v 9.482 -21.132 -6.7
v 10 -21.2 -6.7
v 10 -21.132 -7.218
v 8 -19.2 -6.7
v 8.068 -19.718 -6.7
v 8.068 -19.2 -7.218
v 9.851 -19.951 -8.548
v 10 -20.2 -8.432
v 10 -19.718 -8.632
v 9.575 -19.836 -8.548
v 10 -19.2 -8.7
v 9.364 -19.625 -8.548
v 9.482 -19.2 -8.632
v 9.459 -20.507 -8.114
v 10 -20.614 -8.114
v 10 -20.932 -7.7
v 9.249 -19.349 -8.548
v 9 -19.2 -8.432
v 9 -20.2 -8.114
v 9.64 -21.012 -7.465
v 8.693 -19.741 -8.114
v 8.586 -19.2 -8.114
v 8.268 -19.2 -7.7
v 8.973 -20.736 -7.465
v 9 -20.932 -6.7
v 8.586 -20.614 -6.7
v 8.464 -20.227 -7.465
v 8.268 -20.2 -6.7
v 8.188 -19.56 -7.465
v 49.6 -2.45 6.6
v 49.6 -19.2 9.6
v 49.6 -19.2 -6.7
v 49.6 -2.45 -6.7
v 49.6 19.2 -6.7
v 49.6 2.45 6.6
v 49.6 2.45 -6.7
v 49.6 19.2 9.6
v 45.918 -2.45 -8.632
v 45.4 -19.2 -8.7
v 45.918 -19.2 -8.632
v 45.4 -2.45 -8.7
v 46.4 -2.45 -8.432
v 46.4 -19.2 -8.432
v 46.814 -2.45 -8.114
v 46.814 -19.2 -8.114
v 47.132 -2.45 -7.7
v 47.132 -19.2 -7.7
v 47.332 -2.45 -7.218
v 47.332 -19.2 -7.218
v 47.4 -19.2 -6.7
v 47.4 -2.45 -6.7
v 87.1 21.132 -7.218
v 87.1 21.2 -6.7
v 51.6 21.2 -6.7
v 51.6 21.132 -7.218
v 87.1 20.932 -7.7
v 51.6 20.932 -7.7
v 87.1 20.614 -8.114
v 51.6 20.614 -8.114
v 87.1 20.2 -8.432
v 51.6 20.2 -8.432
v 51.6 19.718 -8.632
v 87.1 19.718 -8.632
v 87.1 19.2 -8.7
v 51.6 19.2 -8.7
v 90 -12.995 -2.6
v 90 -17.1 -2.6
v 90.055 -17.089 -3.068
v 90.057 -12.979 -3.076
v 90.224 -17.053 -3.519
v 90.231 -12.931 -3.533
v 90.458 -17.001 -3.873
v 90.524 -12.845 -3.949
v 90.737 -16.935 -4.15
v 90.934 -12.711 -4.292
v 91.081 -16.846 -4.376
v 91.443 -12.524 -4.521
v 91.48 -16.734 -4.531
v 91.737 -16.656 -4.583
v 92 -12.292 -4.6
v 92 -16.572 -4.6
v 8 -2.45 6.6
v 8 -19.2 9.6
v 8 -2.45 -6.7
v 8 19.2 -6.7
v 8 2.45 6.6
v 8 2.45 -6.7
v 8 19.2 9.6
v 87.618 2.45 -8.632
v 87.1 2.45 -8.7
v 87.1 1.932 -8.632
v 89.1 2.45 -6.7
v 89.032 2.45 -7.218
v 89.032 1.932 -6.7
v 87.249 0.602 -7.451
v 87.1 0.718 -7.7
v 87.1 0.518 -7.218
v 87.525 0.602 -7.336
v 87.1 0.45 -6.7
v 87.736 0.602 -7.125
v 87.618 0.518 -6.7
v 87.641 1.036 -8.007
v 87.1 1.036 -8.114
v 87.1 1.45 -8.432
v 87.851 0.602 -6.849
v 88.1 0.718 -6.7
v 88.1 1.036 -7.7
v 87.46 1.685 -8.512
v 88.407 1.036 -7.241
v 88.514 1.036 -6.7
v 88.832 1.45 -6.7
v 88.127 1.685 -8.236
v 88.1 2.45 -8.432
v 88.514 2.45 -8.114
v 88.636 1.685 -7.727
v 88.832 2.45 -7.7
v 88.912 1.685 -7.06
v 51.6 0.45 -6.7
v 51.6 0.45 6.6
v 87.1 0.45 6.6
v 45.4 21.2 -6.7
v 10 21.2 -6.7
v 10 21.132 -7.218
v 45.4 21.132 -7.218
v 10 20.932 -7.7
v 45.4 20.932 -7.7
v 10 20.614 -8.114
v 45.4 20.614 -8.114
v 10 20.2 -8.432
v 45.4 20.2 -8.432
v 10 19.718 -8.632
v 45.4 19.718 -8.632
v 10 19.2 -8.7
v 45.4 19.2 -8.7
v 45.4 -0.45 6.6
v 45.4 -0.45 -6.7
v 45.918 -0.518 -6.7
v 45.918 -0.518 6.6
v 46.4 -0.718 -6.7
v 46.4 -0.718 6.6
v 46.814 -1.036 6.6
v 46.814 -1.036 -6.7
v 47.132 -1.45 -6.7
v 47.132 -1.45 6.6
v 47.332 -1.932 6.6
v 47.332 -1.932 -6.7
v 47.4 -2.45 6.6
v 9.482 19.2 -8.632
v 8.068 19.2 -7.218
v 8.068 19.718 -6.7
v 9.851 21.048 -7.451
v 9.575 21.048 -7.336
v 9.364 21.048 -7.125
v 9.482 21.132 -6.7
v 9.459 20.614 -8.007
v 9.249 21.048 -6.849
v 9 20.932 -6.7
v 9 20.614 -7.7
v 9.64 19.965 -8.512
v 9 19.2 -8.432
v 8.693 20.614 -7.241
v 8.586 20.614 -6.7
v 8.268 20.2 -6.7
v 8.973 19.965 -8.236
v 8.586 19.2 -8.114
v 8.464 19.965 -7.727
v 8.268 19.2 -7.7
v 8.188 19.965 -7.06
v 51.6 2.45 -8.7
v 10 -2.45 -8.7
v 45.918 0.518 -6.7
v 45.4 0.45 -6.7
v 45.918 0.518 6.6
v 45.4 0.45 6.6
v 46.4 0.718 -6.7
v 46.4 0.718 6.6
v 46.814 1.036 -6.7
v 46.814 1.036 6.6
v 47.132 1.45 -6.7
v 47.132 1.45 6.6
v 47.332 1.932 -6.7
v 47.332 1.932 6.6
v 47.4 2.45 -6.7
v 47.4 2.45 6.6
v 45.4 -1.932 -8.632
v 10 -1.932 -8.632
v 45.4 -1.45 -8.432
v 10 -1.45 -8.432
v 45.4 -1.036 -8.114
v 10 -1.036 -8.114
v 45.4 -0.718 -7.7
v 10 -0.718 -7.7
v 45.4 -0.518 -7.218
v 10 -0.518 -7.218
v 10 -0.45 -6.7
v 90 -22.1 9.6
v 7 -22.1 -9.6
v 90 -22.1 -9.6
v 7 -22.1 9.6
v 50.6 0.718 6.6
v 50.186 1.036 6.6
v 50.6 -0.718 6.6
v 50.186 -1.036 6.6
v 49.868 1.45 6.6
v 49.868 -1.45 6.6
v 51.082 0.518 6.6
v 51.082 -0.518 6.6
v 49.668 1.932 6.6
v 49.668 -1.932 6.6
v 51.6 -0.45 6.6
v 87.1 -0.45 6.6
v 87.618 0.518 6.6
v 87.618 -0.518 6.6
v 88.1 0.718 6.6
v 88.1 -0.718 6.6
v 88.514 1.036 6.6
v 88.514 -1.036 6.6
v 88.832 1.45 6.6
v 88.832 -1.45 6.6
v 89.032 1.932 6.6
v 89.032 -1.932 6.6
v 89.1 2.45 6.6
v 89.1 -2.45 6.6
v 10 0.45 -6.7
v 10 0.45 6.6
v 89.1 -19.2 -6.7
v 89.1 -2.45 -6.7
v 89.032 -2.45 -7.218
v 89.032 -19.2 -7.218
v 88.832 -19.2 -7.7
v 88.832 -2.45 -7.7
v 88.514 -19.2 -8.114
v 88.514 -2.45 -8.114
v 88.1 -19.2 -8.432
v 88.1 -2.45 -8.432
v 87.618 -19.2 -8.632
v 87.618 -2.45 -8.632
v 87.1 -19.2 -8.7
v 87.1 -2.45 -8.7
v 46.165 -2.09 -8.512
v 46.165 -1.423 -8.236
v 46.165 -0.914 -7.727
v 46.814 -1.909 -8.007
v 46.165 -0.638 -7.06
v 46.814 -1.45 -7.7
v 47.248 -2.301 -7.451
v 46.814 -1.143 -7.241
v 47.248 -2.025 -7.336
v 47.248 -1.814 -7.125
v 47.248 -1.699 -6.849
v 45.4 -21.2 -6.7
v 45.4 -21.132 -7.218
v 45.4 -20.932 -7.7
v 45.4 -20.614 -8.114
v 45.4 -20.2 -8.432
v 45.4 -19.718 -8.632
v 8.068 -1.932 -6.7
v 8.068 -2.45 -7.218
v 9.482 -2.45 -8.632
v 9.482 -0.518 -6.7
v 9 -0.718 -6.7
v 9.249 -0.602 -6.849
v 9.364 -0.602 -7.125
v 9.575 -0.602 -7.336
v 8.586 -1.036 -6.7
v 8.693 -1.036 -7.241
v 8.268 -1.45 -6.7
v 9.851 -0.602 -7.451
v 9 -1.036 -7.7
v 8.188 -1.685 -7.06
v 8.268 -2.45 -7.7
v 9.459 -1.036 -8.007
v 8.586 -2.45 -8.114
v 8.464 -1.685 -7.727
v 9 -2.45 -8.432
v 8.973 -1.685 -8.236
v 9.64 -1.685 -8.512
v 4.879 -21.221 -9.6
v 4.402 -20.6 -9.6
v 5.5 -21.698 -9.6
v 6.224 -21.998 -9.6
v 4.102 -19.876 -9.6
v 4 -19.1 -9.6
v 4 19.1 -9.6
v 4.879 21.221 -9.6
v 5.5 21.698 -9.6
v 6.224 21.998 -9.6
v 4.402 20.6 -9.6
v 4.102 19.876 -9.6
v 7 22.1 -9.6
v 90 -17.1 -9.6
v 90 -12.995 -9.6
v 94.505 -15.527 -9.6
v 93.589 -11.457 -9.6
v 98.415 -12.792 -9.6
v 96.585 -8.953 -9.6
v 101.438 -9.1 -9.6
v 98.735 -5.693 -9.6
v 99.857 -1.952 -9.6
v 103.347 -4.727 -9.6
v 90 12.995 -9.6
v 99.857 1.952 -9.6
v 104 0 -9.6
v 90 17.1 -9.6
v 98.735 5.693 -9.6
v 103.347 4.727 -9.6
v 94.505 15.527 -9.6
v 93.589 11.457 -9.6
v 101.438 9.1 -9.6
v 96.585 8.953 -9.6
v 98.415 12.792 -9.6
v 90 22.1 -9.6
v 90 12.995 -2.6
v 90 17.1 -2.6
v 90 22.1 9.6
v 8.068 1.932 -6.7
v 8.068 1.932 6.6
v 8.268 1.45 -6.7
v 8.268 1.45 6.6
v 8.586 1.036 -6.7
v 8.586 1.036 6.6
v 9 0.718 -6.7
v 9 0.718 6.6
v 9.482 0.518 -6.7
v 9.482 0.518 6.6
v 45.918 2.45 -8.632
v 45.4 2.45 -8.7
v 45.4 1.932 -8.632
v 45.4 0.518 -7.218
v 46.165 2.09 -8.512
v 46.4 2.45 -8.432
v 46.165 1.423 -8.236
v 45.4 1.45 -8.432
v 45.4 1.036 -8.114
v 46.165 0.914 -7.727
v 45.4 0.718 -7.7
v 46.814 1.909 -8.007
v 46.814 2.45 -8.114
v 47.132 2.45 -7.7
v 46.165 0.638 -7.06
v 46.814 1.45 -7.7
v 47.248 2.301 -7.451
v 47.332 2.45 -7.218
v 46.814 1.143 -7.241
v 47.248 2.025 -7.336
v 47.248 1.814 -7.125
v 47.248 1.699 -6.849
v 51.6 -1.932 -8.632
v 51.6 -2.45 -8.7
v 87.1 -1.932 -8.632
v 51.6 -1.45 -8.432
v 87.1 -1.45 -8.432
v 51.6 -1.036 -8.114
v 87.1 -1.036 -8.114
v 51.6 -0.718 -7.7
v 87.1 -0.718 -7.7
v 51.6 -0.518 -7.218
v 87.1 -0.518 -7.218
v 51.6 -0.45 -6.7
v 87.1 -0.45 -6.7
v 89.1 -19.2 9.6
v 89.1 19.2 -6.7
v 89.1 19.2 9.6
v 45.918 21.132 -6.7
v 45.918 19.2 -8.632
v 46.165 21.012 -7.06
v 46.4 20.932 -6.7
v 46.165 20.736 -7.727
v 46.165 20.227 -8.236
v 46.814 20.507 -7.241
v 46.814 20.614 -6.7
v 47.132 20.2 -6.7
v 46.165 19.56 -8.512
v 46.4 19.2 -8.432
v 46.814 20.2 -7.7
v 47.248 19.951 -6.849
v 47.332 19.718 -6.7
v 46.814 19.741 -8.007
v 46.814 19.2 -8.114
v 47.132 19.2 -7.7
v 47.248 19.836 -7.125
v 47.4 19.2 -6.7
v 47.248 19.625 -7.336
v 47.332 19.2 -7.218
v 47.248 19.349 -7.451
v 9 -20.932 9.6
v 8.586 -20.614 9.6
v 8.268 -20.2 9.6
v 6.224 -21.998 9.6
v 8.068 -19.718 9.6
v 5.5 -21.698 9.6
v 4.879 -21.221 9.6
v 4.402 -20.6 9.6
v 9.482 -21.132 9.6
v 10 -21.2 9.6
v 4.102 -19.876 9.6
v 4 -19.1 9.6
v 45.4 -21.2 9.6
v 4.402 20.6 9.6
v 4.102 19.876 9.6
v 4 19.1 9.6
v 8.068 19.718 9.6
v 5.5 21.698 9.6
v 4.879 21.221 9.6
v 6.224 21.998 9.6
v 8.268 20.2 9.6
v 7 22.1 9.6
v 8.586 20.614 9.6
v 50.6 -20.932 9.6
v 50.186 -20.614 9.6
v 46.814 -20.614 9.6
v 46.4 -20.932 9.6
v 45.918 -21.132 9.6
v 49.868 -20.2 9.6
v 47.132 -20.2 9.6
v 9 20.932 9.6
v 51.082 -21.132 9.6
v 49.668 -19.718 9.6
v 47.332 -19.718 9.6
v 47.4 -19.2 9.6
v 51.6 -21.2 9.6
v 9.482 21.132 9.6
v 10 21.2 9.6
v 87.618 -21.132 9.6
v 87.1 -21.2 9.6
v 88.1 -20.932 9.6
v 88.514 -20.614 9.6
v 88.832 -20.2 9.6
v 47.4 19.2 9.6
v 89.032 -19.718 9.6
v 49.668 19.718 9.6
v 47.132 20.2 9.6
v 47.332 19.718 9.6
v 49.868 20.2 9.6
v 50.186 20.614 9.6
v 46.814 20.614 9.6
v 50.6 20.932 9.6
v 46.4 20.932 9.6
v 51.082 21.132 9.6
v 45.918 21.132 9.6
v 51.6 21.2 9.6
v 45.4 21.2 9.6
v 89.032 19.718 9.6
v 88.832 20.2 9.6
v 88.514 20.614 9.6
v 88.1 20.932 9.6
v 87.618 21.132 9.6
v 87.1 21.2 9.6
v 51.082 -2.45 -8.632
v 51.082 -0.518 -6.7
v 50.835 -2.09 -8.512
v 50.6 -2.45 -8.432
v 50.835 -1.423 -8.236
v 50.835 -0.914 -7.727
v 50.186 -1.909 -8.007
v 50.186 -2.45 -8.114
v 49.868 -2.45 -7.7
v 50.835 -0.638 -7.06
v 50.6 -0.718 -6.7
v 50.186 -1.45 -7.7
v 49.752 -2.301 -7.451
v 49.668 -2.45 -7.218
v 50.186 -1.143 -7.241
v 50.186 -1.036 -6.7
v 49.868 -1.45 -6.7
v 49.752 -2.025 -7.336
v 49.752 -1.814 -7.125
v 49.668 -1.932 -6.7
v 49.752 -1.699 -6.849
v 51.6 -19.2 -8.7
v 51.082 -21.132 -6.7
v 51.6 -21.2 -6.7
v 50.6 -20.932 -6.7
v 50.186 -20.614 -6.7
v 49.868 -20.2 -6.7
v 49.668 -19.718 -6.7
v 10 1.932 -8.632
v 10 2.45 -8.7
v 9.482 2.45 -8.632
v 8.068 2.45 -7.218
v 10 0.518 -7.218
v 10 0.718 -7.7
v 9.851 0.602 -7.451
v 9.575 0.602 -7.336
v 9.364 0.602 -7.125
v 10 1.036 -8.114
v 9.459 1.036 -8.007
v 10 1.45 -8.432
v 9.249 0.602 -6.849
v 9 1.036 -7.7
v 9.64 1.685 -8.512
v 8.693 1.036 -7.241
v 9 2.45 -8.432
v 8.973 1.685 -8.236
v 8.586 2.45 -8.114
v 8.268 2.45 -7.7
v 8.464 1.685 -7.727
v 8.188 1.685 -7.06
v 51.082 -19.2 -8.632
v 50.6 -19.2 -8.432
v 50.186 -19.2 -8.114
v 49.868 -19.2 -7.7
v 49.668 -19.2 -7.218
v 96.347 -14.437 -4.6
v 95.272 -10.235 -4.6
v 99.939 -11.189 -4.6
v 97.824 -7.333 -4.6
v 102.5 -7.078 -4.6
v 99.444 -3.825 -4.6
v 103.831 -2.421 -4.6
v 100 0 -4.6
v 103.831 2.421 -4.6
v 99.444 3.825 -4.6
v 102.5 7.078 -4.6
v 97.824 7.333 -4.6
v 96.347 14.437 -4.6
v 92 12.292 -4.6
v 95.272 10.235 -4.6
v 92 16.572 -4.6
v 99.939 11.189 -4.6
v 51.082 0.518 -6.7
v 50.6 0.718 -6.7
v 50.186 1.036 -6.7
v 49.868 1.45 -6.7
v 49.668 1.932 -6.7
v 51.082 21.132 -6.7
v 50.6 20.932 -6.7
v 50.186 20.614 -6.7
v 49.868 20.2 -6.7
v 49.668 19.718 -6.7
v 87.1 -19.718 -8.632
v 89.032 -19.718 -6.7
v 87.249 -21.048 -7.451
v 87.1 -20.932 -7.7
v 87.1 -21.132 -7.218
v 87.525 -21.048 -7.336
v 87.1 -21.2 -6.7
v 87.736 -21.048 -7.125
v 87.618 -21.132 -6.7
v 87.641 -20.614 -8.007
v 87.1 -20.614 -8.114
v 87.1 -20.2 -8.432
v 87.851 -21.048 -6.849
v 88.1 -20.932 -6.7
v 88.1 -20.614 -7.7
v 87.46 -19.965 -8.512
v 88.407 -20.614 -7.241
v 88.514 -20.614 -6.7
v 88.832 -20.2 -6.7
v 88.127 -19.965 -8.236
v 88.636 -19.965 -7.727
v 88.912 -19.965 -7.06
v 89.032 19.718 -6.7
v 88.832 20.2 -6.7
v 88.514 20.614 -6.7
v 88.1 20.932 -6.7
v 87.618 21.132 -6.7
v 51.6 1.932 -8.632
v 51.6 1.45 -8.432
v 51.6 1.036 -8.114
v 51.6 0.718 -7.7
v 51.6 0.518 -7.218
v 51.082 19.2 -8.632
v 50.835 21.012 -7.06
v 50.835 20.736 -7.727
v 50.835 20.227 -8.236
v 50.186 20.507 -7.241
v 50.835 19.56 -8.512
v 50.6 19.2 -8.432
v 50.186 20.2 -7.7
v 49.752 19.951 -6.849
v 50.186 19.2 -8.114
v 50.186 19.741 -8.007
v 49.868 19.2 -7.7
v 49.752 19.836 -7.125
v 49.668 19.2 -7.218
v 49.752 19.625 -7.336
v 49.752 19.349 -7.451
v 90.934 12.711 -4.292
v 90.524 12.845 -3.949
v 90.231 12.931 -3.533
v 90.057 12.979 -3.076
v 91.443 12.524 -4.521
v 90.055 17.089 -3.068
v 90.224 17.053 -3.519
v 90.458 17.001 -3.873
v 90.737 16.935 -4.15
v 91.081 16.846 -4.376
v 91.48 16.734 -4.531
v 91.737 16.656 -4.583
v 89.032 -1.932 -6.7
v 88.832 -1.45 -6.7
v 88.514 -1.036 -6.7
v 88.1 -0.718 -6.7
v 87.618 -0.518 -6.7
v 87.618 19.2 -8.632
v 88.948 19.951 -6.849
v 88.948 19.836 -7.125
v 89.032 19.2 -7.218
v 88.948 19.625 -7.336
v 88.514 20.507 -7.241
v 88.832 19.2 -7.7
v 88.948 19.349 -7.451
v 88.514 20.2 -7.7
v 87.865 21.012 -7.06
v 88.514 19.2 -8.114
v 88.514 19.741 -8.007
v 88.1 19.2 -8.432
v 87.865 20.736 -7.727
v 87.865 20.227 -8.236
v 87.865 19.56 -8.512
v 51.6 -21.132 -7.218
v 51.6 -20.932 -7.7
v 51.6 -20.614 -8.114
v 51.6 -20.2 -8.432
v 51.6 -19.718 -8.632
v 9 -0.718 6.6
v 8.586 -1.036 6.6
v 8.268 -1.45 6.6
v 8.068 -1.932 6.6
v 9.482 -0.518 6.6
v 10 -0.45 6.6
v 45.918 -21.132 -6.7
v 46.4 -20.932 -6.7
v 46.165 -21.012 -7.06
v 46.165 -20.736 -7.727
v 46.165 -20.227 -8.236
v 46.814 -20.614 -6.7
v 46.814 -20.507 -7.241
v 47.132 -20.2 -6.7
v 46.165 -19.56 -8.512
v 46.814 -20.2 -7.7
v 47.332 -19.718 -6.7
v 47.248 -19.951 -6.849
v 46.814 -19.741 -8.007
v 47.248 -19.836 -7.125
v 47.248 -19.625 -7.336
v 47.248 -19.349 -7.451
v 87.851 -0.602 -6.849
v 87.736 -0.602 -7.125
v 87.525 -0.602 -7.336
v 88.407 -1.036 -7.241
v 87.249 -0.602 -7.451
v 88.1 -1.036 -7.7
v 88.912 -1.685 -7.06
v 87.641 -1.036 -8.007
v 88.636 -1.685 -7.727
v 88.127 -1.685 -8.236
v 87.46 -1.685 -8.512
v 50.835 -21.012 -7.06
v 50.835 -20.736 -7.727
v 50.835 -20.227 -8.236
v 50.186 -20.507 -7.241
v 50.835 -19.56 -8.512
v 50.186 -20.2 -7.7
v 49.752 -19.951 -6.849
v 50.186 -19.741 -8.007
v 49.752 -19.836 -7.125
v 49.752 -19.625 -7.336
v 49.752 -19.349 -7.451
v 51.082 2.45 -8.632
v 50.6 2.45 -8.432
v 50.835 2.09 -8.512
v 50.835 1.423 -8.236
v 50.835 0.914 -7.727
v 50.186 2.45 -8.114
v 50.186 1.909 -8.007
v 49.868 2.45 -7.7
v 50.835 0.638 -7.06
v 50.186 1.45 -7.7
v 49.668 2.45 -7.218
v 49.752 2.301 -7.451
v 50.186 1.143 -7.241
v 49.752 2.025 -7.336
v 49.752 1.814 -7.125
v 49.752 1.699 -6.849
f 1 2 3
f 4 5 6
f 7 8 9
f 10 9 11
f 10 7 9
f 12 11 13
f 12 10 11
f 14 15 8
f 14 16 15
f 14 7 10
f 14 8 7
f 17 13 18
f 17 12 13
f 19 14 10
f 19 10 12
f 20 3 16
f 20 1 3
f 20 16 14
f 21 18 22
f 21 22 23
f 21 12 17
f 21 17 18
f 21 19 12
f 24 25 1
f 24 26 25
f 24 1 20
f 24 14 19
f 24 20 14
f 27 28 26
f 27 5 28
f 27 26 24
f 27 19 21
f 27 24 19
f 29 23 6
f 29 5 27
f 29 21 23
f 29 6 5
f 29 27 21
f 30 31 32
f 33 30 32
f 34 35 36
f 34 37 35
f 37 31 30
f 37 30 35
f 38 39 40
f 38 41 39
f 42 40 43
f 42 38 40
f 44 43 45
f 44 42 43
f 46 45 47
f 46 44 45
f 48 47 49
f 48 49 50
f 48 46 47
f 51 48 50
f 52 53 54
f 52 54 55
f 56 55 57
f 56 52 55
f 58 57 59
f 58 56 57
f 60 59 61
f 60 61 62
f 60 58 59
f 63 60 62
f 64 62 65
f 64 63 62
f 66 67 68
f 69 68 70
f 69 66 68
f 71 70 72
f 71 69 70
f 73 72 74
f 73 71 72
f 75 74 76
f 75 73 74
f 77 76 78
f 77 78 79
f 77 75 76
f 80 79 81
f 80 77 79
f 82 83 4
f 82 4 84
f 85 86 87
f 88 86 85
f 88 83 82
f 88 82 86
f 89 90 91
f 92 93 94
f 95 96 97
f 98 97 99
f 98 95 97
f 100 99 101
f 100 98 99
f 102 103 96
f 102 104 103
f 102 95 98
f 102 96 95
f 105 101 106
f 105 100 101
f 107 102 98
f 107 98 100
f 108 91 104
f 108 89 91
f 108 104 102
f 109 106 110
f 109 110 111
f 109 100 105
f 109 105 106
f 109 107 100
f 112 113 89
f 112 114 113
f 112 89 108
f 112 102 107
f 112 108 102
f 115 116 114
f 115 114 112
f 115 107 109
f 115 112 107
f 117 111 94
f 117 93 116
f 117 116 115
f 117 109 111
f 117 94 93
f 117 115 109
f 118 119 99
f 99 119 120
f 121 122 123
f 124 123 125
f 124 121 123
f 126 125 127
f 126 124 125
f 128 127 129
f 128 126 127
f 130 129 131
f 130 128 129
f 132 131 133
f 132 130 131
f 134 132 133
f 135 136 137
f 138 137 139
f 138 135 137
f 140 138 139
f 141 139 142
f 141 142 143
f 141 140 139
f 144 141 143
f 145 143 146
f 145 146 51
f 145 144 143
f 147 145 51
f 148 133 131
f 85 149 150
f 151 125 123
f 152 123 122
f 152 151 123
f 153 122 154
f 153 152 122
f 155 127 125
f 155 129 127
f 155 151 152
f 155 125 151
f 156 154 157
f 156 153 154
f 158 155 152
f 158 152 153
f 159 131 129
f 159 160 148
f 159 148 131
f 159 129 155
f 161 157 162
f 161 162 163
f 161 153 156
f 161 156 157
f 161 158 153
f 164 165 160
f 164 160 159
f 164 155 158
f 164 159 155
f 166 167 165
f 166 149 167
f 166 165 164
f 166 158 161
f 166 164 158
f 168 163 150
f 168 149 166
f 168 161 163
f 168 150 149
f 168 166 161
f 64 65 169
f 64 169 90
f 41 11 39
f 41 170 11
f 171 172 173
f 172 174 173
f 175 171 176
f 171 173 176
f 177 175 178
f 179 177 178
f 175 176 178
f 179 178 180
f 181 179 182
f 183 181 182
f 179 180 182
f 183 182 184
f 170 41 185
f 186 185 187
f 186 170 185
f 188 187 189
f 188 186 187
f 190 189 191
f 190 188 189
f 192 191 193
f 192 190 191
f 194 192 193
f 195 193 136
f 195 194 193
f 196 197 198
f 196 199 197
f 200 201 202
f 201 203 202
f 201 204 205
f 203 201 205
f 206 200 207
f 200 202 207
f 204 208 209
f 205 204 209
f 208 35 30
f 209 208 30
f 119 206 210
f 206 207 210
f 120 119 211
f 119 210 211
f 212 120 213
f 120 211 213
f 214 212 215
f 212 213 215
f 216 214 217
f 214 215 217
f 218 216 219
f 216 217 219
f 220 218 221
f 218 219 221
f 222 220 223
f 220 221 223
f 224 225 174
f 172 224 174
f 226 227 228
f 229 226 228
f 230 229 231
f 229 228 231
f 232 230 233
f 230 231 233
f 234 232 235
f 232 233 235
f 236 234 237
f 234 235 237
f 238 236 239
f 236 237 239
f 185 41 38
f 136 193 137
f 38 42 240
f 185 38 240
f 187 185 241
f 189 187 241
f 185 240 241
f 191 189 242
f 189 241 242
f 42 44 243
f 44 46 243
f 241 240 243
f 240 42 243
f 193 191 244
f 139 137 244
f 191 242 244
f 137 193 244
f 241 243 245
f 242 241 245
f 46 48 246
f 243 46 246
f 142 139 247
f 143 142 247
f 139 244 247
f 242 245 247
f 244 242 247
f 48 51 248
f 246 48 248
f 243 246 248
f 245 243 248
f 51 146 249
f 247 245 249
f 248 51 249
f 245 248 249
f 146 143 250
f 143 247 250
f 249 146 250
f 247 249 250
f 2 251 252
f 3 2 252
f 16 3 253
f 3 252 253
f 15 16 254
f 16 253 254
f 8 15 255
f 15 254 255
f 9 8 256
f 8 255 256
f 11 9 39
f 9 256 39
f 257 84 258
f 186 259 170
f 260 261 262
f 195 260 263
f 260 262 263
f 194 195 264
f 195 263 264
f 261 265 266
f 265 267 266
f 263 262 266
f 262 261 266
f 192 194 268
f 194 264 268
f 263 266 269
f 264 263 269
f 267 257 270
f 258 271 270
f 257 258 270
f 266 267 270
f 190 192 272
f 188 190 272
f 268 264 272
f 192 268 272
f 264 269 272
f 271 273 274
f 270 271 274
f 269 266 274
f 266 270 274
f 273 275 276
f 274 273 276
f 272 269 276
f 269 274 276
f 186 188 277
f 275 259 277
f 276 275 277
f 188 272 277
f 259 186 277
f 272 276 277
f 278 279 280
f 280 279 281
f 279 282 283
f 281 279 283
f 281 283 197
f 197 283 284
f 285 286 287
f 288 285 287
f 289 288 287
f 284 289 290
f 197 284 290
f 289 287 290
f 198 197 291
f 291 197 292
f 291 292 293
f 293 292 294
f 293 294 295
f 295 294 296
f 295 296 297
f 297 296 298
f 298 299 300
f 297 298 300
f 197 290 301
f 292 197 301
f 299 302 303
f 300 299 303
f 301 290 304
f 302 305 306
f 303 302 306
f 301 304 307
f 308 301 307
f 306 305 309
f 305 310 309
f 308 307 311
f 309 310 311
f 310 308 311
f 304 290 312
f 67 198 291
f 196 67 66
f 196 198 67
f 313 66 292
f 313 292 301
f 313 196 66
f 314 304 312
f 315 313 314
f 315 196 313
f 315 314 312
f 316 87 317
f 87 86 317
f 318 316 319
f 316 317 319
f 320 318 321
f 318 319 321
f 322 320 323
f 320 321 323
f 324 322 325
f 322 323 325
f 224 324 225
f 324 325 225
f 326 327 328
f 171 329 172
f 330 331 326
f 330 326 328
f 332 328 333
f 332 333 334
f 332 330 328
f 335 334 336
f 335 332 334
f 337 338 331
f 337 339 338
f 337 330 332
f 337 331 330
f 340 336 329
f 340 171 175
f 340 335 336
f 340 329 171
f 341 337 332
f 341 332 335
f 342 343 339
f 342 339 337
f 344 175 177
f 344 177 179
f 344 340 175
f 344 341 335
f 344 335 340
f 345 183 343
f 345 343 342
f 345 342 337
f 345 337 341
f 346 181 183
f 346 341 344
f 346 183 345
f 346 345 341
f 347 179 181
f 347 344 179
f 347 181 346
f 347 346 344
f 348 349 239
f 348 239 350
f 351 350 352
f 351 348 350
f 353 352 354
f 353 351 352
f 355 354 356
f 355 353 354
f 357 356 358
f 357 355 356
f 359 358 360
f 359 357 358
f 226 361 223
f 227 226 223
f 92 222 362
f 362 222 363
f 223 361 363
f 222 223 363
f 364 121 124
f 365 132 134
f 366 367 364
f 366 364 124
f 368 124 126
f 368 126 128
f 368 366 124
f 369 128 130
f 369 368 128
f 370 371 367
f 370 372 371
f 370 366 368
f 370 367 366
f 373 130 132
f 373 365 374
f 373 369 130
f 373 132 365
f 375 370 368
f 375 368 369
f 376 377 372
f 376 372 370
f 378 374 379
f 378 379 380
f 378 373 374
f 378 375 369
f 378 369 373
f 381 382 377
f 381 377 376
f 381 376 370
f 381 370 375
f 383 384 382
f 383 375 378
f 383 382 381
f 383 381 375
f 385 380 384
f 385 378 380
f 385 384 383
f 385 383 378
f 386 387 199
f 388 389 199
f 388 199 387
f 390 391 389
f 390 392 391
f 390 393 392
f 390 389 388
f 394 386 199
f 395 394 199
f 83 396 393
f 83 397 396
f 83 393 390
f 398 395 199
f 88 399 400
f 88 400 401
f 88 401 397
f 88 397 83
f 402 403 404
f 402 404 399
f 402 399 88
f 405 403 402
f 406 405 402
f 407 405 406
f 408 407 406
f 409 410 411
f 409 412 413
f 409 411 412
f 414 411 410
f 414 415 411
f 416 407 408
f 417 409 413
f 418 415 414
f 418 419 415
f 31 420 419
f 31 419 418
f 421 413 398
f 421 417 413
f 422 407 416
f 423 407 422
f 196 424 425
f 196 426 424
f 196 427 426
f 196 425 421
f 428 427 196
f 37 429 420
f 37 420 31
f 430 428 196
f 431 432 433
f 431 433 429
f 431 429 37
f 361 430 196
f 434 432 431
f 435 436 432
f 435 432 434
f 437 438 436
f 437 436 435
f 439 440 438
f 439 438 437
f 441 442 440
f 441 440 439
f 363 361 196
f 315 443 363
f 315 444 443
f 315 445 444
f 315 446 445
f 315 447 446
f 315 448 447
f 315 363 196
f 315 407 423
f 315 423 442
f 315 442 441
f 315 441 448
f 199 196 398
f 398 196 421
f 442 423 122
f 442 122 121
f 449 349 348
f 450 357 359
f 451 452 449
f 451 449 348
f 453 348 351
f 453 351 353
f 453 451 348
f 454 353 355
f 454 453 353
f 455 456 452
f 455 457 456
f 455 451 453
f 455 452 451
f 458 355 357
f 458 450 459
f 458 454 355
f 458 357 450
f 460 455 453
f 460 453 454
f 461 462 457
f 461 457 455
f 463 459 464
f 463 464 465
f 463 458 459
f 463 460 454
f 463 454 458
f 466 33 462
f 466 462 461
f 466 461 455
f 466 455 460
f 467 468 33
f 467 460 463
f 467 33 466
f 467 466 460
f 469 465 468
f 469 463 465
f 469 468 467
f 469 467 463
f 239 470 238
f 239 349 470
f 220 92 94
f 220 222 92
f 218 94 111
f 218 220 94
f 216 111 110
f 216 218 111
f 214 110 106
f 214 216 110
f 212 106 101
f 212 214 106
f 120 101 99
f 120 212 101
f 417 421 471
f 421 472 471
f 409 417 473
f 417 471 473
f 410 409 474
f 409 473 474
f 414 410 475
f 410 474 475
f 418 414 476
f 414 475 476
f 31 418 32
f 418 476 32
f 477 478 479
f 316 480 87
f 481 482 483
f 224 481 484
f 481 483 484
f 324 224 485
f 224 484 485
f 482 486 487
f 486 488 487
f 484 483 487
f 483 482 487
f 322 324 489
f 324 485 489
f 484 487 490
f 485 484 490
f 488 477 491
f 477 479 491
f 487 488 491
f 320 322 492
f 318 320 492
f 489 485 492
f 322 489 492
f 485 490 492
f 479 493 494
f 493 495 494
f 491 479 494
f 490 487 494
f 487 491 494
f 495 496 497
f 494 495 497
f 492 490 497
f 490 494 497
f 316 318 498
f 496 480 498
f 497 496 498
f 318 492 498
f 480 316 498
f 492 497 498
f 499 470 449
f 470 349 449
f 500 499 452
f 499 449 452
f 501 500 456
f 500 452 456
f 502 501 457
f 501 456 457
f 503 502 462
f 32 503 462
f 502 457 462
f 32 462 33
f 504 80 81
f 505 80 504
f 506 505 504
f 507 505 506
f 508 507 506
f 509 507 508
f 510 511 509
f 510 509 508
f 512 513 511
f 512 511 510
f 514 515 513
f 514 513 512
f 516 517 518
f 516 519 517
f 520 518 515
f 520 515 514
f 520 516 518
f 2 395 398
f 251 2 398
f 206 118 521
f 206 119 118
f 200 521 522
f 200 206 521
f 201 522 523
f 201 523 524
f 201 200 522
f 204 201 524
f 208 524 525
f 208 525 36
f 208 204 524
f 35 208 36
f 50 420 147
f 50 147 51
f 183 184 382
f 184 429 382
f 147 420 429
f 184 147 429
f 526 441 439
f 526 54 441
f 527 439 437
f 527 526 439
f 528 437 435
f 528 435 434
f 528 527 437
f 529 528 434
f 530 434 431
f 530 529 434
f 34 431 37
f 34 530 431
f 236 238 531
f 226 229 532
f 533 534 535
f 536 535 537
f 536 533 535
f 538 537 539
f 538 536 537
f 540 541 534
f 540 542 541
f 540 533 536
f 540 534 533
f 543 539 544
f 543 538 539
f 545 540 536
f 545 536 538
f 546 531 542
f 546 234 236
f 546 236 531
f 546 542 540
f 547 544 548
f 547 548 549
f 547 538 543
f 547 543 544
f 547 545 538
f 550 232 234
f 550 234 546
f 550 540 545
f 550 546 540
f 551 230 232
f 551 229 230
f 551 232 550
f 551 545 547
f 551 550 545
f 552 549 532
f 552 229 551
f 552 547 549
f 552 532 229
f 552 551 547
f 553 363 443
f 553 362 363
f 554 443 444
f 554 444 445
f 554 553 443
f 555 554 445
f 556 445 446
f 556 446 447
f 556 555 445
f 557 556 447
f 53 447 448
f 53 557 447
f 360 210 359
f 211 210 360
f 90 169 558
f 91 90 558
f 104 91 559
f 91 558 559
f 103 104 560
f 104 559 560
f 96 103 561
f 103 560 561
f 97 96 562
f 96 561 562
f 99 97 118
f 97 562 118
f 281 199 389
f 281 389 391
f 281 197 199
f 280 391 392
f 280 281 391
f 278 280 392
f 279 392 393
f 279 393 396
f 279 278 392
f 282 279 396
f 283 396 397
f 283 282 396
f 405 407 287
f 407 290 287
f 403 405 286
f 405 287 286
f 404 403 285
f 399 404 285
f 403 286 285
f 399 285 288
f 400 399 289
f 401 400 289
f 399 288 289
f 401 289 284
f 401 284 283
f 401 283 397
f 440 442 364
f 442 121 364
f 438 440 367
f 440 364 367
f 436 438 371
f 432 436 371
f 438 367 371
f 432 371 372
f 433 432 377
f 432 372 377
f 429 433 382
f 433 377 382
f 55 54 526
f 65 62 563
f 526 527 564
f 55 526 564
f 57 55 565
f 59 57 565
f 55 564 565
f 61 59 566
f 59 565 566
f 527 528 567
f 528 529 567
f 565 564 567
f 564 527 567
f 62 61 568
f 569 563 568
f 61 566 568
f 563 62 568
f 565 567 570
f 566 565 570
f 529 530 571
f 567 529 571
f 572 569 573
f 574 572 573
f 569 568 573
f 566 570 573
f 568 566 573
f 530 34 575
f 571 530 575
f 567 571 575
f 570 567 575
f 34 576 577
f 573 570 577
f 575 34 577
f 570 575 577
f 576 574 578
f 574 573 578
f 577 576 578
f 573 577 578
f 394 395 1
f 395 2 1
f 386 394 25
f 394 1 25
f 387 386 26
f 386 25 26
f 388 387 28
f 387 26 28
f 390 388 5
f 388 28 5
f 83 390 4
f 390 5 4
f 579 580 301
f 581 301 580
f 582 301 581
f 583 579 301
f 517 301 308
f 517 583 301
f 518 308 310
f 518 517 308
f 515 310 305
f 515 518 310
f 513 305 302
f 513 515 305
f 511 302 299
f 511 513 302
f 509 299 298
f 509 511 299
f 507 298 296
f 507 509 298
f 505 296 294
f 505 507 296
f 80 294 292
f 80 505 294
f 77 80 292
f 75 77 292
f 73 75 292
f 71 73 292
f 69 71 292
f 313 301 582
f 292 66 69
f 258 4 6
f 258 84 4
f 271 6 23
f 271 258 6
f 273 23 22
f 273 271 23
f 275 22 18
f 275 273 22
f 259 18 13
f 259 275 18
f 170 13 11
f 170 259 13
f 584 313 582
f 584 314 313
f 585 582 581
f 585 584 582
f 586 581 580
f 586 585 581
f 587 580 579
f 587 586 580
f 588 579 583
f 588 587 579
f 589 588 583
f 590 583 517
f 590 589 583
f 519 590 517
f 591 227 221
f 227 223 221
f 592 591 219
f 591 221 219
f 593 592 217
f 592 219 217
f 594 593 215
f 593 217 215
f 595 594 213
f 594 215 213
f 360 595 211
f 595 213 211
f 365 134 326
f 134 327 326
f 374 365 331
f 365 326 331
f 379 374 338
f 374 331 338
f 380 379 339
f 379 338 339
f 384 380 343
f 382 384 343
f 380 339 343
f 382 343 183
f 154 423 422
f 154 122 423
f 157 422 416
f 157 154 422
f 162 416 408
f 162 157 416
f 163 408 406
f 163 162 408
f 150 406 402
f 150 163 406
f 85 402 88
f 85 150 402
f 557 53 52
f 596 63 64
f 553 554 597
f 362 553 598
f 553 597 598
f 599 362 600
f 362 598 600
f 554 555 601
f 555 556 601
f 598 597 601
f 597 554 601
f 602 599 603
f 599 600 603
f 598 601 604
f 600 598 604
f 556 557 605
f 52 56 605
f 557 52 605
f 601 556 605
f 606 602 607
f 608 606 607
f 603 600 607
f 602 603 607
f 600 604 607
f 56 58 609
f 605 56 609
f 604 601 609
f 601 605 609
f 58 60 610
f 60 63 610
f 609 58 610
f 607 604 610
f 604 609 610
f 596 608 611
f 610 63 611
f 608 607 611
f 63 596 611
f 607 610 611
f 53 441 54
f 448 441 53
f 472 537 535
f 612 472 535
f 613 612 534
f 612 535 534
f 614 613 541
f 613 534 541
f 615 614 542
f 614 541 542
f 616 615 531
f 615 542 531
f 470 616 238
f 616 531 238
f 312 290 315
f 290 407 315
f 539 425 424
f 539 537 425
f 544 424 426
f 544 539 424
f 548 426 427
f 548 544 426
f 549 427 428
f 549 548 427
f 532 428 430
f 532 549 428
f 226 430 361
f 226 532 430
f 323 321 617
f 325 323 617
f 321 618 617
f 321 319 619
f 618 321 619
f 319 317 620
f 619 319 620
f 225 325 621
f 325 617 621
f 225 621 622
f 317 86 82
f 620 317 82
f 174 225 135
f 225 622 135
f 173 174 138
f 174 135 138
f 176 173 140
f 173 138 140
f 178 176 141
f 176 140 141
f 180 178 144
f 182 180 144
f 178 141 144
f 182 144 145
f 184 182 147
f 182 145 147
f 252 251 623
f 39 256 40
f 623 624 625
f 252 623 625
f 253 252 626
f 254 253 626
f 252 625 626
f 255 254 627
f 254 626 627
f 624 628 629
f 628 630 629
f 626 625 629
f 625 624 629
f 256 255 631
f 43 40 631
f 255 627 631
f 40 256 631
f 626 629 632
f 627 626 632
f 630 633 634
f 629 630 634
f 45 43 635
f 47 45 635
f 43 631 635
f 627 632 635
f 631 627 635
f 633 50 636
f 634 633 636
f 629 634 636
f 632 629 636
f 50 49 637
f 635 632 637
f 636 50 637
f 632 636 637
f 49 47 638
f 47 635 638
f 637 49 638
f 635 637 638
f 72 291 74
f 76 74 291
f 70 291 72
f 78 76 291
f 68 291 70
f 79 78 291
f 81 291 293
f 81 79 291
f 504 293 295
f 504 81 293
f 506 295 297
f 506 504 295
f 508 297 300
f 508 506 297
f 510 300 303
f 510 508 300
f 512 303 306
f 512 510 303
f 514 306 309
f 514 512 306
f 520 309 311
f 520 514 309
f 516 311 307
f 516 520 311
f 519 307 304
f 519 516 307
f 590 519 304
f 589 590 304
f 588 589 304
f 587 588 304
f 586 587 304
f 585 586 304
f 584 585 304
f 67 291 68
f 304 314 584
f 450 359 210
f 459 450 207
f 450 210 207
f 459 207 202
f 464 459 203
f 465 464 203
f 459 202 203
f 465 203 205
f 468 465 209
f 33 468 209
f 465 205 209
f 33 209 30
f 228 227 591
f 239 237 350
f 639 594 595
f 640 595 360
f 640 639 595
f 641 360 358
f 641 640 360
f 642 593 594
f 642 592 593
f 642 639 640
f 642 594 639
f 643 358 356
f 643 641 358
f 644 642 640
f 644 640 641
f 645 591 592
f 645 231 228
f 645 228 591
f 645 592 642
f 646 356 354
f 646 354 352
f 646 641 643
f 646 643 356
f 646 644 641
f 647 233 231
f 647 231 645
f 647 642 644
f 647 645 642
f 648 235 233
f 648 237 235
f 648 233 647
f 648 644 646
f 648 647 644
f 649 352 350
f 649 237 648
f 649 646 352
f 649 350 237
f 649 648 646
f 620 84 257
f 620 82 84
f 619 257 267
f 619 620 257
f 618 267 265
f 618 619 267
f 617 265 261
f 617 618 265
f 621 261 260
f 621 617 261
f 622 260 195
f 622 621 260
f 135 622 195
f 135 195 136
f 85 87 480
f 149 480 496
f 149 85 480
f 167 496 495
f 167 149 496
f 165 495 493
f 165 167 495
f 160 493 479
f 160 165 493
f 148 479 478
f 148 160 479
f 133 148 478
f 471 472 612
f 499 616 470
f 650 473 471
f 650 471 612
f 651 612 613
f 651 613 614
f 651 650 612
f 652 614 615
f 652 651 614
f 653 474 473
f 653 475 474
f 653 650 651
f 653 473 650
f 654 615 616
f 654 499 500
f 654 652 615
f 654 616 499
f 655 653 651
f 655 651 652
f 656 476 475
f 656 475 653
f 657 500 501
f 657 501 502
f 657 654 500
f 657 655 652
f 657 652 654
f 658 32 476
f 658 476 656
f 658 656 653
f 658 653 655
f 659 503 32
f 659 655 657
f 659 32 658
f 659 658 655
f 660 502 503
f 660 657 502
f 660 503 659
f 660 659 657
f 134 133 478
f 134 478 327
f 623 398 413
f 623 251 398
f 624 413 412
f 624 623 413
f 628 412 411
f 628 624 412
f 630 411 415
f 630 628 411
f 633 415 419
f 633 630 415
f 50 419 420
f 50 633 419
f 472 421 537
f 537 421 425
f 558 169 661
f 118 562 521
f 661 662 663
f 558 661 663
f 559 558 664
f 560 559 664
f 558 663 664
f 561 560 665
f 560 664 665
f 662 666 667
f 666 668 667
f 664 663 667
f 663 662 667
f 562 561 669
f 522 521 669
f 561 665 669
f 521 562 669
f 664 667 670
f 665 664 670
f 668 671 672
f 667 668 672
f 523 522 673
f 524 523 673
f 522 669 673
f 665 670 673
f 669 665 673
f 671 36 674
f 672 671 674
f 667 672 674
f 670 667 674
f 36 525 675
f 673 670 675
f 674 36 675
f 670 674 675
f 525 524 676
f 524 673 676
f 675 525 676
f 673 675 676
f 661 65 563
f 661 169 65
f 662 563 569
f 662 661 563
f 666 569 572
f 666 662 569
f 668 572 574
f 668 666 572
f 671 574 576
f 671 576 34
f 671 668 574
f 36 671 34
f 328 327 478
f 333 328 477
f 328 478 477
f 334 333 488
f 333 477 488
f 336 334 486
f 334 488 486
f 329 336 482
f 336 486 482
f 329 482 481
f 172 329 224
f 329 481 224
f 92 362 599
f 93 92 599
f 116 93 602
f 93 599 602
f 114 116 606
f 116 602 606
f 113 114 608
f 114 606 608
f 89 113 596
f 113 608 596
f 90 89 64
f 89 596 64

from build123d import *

# Parameters (mm, degrees)
SKETCH_1_W                  = 86
SKETCH_1_H                  = 44.2
EXTRUDE_1_DEPTH             = 14.2
EXTRUDE_2_DEPTH             = 5
SKETCH_3_W                  = 81.1
SKETCH_3_H                  = 42.4
CUT_EXTRUDE_1_DEPTH         = 18.3
HOLE_WIZARD_8_3_8_3_1_D     = 8.3
HOLE_WIZARD_8_3_8_3_1_DEPTH = 3.2
RIB_1_REACH                 = 108.755
SKETCH_6_WALL_W             = 296.60943773
SKETCH_6_WALL_H             = 0.9
FILLET_1_R                  = 3
EXTRUDE_START               = -3.5
SKETCH_7_R                  = 4.15
EXTRUDE_3_DEPTH             = 3.5
FILLET_2_R                  = 2
SKETCH_9_W                  = 2.2
SKETCH_9_H                  = 19.2
EXTRUDE_4_DEPTH             = 44
FILLET_3_R                  = 2


with BuildPart() as part:
    # Эскиз1 → Бобышка-Вытянуть1 (new body)
    with BuildSketch(Plane.XY.offset(9.6)):
        with Locations((47, 0)):
            Rectangle(SKETCH_1_W, SKETCH_1_H)
    extrude(amount=-EXTRUDE_1_DEPTH)

    # Эскиз2 → Бобышка-Вытянуть2 (add)
    with BuildSketch(Plane(origin=(0, 0, -4.6), x_dir=(-1, 0, 0), z_dir=(0, 0, -1))):
        with BuildLine():
            Line((-90, -22.1), (-90, -17.1))
            ThreePointArc((-90, -17.1), (-104, 0), (-90, 17.1))
            Line((-90, 17.1), (-90, 22.1))
            Line((-90, 22.1), (-4, 22.1))
            Line((-4, 22.1), (-4, -22.1))
            Line((-4, -22.1), (-90, -22.1))
        make_face()
        with BuildLine():
            Line((-90, -12.994779171), (-90, 12.994779171))
            ThreePointArc((-90, 12.994779171), (-100, 0), (-90, -12.994779171))
        make_face(mode=Mode.SUBTRACT)
    extrude(amount=EXTRUDE_2_DEPTH)

    # Эскиз3 → Вырез-Вытянуть1 (cut)
    with BuildSketch(Plane.XY.offset(9.6)):
        with Locations((48.55, 0)):
            Rectangle(SKETCH_3_W, SKETCH_3_H)
    extrude(amount=-CUT_EXTRUDE_1_DEPTH, mode=Mode.SUBTRACT)

    # Диаметр отверстия Ø8.3 (8.3)1
    with Locations(Plane.ZY.offset(-4)):
        with Locations((0, 0)):
            Hole(HOLE_WIZARD_8_3_8_3_1_D / 2, depth=HOLE_WIZARD_8_3_8_3_1_DEPTH)

    # Эскиз6 wall → Ребро1 (add, up to next)
    with BuildSketch(Plane(origin=(48.55, 0, 6.6), x_dir=(1, 0, 0), z_dir=(0, 0, -1)), mode=Mode.PRIVATE) as rib_1_sk1:
        Rectangle(SKETCH_6_WALL_W, SKETCH_6_WALL_H)
    rib_1_tool1 = extrude(rib_1_sk1.sketch, amount=RIB_1_REACH, mode=Mode.PRIVATE) - part.part
    add(rib_1_tool1.solids().sort_by_distance((48.55, 0, 6.6))[0])

    # Скругление1
    fillet_1_edges = [part.edges().sort_by_distance(p)[0] for p in [
        (4, -22.1, 0),
        (4, 22.1, 0),
    ]]
    fillet(fillet_1_edges, radius=FILLET_1_R)

    # Эскиз7 → Бобышка-Вытянуть3 (add)
    with BuildSketch(Plane.ZY.offset(-4).offset(EXTRUDE_START)):
        Circle(SKETCH_7_R)
    extrude(amount=EXTRUDE_3_DEPTH)

    # Скругление2
    fillet_2_edges = [part.edges().sort_by_distance(p)[0] for p in [
        (90, -15.047389586, -4.6),
        (90, 15.047389586, -4.6),
        (8, 10.825, -8.7),
        (8, -21.2, 0.45),
        (48.55, 21.2, -8.7),
        (8, 21.2, 0.45),
        (89.1, -10.825, -8.7),
        (89.1, 21.2, 0.45),
        (48.55, -21.2, -8.7),
        (89.1, -21.2, 0.45),
        (8, -10.825, -8.7),
        (89.1, 10.825, -8.7),
        (48.55, 0.45, -8.7),
        (8, 0.45, -1.05),
        (89.1, 0.45, -1.05),
        (8, -0.45, -1.05),
        (89.1, -0.45, -1.05),
        (48.55, -0.45, -8.7),
    ]]
    fillet(fillet_2_edges, radius=FILLET_2_R)

    # Эскиз9 → Бобышка-Вытянуть4 (add)
    with BuildSketch(Plane(origin=(0, 22.1, 0), x_dir=(1, 0, 0), z_dir=(0, 1, 0))):
        with Locations((48.5, 0)):
            Rectangle(SKETCH_9_W, SKETCH_9_H)
    extrude(amount=-EXTRUDE_4_DEPTH)

    # Скругление3
    fillet_3_edges = [part.edges().sort_by_distance(p)[0] for p in [
        (47.4, 1.035786438, -8.114213562),
        (49.6, 1.035786438, -8.114213562),
        (49.6, -10.825, -8.7),
        (49.6, 0.45, -0.05),
        (49.6, 10.825, -8.7),
        (47.4, 10.825, -8.7),
        (47.4, 0.45, -0.05),
        (47.4, -10.825, -8.7),
        (49.6, -20.614213562, -8.114213562),
        (49.6, -21.2, 1.45),
        (49.6, 21.2, 1.45),
        (49.6, 20.614213562, -8.114213562),
        (49.6, -0.45, -0.05),
        (49.6, -1.035786438, -8.114213562),
        (47.4, -21.2, 1.45),
        (47.4, -20.614213562, -8.114213562),
        (47.4, -1.035786438, -8.114213562),
        (47.4, -0.45, -0.05),
        (47.4, 20.614213562, -8.114213562),
        (47.4, 21.2, 1.45),
    ]]
    fillet(fillet_3_edges, radius=FILLET_3_R)


solid = part.part
